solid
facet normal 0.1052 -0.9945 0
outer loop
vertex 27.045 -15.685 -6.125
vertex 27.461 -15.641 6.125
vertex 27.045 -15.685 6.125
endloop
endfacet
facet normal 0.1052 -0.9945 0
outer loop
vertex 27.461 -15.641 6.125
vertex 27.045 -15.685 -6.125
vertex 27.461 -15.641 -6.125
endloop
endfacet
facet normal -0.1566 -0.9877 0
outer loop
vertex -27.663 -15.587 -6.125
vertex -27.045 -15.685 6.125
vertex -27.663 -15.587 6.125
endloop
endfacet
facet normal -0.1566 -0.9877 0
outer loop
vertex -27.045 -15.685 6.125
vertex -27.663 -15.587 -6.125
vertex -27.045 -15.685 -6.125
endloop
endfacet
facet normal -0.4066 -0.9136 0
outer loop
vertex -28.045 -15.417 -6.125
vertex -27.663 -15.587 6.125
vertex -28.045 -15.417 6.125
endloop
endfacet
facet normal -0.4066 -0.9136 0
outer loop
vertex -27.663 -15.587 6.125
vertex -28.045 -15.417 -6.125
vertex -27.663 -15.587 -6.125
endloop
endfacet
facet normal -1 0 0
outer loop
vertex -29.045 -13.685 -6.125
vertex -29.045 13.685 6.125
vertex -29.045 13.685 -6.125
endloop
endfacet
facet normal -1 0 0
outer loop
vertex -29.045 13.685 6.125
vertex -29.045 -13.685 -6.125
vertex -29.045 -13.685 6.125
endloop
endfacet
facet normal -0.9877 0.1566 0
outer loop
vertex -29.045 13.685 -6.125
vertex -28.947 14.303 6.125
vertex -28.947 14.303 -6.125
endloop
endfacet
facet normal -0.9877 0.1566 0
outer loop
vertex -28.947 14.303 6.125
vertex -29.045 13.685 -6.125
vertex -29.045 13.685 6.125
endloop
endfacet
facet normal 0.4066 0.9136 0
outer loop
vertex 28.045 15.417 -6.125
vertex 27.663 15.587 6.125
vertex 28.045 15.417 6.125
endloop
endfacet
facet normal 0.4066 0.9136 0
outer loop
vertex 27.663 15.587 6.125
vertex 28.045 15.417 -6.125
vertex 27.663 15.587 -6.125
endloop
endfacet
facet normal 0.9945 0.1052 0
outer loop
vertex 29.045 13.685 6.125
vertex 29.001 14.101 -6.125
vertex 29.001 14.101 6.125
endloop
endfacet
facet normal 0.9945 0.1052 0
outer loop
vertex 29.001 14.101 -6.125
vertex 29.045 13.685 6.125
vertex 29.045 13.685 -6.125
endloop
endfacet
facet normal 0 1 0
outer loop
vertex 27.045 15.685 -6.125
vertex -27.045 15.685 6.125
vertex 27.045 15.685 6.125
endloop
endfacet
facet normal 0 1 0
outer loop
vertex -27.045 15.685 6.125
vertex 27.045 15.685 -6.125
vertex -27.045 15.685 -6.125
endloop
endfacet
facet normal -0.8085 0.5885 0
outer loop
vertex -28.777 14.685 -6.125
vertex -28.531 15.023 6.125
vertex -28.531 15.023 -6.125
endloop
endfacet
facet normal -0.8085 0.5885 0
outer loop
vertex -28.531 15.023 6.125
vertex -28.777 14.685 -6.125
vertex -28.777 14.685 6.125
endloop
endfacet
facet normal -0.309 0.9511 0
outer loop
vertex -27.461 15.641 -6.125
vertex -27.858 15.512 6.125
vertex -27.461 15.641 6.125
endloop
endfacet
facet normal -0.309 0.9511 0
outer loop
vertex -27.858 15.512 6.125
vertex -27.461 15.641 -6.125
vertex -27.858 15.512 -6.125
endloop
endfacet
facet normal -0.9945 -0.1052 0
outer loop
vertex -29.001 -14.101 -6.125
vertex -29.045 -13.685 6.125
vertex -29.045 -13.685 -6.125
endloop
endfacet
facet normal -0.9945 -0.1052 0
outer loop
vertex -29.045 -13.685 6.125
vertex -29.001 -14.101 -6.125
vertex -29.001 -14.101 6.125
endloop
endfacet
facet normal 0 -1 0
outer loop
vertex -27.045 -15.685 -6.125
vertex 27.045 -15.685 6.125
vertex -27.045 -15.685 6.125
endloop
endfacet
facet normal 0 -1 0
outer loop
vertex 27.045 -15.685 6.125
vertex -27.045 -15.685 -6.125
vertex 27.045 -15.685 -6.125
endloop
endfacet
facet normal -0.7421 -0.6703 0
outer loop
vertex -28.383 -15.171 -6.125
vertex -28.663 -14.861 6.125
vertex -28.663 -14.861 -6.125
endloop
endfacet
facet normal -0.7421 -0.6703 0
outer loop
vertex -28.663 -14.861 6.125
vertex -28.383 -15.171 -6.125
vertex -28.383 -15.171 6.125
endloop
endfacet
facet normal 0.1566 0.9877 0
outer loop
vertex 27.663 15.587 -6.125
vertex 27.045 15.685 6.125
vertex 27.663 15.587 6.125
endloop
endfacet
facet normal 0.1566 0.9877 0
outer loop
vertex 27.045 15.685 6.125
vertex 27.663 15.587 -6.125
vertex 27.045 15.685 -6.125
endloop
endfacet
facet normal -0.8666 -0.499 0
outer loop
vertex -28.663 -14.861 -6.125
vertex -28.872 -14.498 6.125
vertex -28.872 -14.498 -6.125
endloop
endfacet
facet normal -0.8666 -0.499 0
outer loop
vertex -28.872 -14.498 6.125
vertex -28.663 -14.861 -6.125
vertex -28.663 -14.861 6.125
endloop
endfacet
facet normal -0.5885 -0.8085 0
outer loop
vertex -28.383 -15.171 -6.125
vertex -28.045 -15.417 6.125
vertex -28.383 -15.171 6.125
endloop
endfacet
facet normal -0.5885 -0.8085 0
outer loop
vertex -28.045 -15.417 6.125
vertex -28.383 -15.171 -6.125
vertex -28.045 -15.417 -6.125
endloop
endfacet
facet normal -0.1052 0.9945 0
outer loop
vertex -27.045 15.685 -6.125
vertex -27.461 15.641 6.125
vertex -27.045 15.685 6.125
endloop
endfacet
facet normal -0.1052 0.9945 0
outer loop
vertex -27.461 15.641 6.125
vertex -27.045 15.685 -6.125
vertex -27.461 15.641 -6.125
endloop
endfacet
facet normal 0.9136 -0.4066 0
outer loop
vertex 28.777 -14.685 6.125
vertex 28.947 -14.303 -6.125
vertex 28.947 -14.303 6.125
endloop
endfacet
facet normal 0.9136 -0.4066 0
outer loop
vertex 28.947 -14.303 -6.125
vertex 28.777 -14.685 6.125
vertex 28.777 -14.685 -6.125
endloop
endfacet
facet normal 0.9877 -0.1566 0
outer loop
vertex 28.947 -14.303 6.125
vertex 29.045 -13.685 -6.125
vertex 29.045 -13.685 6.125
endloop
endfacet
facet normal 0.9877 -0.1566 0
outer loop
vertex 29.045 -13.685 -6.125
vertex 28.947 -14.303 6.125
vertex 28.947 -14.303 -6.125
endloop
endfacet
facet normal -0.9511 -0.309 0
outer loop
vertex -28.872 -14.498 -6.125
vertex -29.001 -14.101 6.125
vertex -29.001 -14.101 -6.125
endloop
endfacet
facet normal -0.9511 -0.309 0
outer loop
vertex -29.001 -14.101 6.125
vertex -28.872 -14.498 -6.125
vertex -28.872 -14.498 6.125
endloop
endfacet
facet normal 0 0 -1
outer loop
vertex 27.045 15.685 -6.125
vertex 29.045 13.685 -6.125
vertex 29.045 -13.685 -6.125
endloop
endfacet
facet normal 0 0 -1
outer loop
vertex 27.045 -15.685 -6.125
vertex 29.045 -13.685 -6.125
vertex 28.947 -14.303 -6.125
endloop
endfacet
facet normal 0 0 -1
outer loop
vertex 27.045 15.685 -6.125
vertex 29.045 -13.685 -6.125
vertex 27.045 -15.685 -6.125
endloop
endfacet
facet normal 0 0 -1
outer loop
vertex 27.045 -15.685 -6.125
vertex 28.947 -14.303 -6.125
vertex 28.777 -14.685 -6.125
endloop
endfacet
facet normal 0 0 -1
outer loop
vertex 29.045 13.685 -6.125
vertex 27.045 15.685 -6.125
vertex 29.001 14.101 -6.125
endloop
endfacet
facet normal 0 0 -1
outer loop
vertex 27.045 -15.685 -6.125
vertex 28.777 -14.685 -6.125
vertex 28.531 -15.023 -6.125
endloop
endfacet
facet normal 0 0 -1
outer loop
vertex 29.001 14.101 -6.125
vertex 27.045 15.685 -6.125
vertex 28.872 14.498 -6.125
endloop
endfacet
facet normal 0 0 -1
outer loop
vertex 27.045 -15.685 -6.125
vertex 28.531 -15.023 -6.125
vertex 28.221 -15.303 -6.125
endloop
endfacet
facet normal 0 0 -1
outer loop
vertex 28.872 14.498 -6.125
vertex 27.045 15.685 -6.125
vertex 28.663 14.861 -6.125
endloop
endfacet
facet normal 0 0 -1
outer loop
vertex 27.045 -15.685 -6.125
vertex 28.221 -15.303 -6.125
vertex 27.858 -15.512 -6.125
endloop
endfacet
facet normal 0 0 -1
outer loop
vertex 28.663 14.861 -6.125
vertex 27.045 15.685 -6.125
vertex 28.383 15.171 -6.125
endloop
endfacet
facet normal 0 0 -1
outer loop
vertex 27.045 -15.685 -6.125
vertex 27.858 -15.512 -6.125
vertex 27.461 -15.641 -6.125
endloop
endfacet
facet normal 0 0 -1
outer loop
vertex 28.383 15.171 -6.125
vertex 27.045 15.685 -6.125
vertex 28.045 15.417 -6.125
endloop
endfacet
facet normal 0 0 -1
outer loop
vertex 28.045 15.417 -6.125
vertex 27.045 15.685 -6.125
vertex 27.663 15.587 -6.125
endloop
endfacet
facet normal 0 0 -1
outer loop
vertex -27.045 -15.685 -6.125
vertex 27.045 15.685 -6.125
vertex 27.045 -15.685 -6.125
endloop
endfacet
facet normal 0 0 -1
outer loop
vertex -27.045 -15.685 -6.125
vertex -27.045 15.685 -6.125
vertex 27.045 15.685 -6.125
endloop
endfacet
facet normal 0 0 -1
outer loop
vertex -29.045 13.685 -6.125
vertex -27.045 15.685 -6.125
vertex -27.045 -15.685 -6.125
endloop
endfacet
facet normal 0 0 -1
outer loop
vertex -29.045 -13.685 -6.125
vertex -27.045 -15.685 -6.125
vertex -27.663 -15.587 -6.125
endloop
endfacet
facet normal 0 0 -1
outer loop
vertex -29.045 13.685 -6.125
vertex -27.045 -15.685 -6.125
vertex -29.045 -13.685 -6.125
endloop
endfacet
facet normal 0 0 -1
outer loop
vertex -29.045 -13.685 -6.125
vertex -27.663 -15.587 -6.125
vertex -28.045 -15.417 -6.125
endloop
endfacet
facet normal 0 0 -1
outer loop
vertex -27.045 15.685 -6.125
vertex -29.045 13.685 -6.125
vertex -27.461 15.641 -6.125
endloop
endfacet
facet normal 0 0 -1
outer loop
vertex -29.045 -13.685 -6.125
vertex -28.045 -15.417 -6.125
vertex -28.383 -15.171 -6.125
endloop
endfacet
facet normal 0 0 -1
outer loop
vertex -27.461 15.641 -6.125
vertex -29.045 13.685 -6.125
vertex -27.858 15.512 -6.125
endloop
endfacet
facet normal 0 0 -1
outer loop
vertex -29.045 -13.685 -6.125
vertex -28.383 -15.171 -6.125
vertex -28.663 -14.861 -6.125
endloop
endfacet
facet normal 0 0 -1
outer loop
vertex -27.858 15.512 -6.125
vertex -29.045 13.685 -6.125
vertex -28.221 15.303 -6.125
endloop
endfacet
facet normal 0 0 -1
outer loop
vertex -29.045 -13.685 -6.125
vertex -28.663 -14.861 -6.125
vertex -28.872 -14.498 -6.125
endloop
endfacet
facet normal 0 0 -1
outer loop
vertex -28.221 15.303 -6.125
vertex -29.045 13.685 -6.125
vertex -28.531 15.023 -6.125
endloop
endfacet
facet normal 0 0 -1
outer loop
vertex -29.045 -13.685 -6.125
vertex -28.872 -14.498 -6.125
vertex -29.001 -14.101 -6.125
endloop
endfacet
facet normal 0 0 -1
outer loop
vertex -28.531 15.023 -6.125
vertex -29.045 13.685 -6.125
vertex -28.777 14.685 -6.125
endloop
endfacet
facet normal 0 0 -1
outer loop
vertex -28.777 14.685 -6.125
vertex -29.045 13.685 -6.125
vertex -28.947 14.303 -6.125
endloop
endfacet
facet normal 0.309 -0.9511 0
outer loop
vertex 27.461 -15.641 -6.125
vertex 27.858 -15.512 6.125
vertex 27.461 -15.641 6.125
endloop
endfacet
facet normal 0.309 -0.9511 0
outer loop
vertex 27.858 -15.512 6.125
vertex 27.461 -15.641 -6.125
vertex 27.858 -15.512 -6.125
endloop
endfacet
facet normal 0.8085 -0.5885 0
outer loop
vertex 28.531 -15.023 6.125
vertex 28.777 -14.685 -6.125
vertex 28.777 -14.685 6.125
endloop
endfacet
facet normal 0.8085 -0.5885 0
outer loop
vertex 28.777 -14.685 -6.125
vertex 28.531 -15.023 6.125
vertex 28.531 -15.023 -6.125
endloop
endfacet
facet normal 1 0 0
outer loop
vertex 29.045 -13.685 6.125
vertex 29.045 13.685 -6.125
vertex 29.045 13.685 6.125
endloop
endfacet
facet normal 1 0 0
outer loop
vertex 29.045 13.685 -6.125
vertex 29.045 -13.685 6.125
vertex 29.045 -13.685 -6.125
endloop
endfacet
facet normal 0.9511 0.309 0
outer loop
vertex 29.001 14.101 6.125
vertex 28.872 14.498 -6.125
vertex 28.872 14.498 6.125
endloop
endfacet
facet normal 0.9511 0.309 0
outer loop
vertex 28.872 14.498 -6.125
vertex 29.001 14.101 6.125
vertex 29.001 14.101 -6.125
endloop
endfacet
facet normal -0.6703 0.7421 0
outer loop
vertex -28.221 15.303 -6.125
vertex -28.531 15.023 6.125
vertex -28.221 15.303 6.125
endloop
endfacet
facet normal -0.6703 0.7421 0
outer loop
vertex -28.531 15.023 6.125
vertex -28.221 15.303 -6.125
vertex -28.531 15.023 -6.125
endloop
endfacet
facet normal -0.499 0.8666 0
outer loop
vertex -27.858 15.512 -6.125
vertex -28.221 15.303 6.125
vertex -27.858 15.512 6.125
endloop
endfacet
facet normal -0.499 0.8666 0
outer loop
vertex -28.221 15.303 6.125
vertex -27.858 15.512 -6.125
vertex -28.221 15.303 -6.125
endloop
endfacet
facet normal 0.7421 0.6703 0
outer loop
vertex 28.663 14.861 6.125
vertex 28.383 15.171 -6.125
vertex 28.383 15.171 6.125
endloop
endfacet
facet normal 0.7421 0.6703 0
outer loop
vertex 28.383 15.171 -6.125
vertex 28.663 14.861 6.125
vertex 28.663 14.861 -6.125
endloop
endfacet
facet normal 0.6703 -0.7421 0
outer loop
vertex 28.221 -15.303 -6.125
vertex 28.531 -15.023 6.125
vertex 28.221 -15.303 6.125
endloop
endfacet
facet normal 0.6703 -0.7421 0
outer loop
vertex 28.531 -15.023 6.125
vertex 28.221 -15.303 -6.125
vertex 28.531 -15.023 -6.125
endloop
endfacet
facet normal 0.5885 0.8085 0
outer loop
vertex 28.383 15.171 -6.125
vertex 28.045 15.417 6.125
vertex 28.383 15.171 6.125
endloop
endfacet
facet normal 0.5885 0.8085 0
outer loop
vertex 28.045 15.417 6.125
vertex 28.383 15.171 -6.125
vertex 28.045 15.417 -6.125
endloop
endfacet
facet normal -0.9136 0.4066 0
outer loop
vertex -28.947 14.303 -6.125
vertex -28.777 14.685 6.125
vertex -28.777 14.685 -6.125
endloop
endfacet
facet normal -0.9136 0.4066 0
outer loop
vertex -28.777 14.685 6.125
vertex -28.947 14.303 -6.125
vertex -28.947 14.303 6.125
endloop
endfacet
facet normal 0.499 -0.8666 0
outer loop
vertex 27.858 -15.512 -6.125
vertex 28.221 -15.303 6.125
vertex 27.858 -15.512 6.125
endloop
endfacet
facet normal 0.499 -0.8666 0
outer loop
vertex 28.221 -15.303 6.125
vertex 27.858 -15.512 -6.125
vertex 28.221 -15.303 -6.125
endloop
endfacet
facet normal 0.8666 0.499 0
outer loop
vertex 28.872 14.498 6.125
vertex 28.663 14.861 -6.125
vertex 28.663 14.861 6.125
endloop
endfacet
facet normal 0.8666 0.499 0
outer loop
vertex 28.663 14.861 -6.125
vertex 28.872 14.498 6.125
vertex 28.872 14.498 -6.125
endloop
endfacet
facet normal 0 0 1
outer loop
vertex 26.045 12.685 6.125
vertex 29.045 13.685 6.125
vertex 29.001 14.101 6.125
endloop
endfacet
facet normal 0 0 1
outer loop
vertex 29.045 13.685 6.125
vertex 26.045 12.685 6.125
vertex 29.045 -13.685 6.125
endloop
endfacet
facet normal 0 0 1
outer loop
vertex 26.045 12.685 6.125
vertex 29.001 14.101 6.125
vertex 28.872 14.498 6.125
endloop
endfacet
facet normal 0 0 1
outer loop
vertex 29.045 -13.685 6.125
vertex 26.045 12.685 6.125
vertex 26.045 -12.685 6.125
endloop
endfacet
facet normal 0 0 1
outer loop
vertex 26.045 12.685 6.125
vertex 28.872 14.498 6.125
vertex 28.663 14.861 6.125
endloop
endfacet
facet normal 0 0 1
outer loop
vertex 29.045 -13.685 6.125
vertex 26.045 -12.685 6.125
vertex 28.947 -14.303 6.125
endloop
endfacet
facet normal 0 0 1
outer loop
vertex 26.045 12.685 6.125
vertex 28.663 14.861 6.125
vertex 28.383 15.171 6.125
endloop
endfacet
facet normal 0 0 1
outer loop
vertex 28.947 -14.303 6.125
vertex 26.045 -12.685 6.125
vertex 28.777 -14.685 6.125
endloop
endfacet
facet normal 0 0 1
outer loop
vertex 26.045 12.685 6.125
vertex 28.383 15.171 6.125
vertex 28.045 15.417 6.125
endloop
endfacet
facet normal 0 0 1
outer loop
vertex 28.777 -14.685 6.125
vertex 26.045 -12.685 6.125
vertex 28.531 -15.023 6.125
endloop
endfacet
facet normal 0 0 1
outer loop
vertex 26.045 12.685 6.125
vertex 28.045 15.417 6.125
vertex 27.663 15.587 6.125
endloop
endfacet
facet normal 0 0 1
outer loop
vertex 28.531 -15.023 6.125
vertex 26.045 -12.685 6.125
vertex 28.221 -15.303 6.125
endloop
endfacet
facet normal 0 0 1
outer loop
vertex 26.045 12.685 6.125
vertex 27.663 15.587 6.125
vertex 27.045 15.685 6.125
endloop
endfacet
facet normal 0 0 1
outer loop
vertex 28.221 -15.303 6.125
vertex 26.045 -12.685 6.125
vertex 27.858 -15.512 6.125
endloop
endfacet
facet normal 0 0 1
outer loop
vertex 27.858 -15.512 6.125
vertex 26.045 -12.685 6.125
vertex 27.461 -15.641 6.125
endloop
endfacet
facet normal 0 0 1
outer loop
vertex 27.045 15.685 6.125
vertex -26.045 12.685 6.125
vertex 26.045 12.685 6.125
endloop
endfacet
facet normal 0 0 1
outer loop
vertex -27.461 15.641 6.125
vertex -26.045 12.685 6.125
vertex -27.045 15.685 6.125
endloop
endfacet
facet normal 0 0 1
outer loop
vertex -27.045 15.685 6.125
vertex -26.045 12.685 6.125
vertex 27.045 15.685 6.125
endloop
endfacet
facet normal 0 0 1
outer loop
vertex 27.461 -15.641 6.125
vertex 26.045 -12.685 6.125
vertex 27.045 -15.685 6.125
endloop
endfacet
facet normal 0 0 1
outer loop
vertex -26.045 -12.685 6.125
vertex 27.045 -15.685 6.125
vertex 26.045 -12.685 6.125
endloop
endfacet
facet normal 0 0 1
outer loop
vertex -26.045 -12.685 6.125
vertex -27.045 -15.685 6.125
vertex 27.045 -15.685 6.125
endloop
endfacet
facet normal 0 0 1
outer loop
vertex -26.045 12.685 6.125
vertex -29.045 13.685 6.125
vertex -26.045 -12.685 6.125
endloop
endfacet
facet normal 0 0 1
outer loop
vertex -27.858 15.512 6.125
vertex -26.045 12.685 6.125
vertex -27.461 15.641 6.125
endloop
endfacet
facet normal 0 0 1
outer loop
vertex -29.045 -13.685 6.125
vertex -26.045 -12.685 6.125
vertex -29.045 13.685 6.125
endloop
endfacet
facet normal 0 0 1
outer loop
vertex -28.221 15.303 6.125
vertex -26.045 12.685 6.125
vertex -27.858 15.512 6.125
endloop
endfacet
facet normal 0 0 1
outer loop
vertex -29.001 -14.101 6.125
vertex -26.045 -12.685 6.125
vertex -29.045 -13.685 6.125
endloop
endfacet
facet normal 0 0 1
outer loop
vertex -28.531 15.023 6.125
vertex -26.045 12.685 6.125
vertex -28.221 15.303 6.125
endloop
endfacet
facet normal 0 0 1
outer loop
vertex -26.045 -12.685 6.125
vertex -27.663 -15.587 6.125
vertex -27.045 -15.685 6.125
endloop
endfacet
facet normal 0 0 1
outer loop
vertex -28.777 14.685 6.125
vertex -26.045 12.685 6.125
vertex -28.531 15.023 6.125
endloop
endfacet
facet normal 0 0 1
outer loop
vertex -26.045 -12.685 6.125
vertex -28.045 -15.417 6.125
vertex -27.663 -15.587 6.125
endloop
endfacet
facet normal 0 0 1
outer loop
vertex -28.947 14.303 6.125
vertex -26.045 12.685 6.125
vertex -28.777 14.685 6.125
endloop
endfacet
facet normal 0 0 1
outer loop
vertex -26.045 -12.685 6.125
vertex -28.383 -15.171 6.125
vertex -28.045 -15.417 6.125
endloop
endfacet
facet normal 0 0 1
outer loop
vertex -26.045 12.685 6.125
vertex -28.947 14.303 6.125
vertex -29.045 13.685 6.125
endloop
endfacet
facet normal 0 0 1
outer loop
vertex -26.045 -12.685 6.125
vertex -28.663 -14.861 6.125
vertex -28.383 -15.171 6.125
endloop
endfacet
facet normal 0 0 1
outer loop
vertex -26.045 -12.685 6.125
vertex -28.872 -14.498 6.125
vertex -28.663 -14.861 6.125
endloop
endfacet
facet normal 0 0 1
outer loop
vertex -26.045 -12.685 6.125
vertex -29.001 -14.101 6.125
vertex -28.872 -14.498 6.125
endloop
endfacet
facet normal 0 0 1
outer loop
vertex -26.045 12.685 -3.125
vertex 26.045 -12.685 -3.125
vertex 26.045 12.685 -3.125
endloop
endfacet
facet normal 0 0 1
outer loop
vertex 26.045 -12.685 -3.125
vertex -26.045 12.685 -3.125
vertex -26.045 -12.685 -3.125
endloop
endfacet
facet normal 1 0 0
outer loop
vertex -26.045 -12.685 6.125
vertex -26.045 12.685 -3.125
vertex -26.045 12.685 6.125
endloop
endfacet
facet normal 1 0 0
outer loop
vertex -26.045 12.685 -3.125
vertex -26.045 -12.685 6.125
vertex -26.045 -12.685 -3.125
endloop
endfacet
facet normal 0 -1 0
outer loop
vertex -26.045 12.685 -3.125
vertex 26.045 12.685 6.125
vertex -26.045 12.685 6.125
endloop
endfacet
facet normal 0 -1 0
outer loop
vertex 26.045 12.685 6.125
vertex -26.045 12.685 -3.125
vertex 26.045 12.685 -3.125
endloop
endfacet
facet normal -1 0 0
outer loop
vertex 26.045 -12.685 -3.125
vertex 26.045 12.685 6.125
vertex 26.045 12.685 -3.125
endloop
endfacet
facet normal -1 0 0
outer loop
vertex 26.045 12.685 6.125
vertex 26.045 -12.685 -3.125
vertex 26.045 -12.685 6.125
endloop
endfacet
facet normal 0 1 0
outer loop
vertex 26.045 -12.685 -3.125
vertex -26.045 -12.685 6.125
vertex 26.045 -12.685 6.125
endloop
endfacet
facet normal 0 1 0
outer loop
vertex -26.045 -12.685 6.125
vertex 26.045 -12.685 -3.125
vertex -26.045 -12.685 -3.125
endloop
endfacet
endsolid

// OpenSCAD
// file: myTools.scad
module tube (r = 0, d = 0, l = 0, 
            thick = 0, 
            bCentered = true, 
            taper_pct = 0, 
            circlip = false) // r=radius d=dia l=length 
{
    assert( r != 0 || d != 0, "specify one of radius or diameter");
    assert( l != 0 , "tube: need length 'l' to be non zero");
    assert( thick != 0, "wall thickness cannot be zero");

    punch = $preview ? .2 : 0; // stop funny view artifact

    dia = r ? r * 2 : d;

    od = ((thick > 0) ? dia + thick * 2 : dia);
    id = (thick > 0) ? dia             : dia  + thick *2; 

    
    
    if (thick > 0)
        echo ("tube\tMIN id = ", id, "od = ", od, "wall = ", thick, "center= ", bCentered);
    else
        echo ("tube\tMAX od = ", od, "id = ", id, "wall = ", thick, "center= ", bCentered);

    echo ("tube\tHeigth = ", l);
        
    if (taper_pct != 0)
    {
        echo ("tube\t*** OD expanded by ", taper_pct, "%, : bottom od = ", od * (1. +taper_pct/100), "top od = ", od);
    }
    
    assert(dia || dia < 0, "tube : missing r or d ");
    
    // if taper_pct specified, the base will always be closest to 0,0,0
    translate([ 0, 0, taper_pct == 0 ? 0: bCentered ? l/2:l  ])
    rotate([0, taper_pct == 0 ? 0 : 180, 0 ])

    difference()
    {
        // make a reese's cup
        {
            color("YELLOW", .3)
            linear_extrude(height= l, scale = 1 + taper_pct/100)
                difference()
                {
                    circle(d = od);
                    circle(d = .5);
                }
        }
    
     // hollow out reessed cup
     color("GREEN")
     translate([0, 0, -punch/2])
     linear_extrude(height= l+ punch*2, $fn=100)
     {
        circle(d = id);
        if (circlip) #square([1 + punch, od ]);
     }
    
    }
}
//==============================================================================
        
module abox (dims, 
            thick = 0, 
            bCentered = true, 
            round_out = 0, 
            round_in = 0, 
            bSolid = false,
            bHollow = false,
            elevator = 0)   // move bottom up by X
{
    punch = $preview ? .1 : 0; // stop funny view artifact
    
    assert(thick != 0, "Thick must be specified. +=outside dim, -= inside dims");
    assert(dims.z > thick, "wall thickness too large for depth of box");

    wall2 = abs(thick) * 2; // 2 walls in each direction
    wall = wall2 / 2;
    
    // box either grows inward (thick < 0) or outward (thick > 0)  from dims
    fat = dims + [ wall2, wall2, wall];
    thin = dims - [ wall2, wall2, wall];
    
    offset = (thick > 0 && bCentered == false) ? wall : 0;
    
    //echo ("abox : adjusting x,y,z by ", offset, " to move origin from  center to 0,0,0");
    translate( [ bCentered ? 0 : dims.x /2 + offset, bCentered ? 0 : dims.y /2 + offset, bCentered ? 0 : dims.z /2 + offset/2]) 
    {
        if (thick > 0)
        {   
            // wall grows outwards from users dim
            echo ("making a box, MAX INSIDE dim = ", dims, "a wall=", thick, "mm ... max outside = ", fat, " mm");
        }
        else
        {
            // wall grows inward from users dime
            echo ("making a box, MAX OUTSIDE dim = ", dims, "a wall=", thick, "mm ... min inside = ", thin, " mm");
        }
        
        // linear extrude alway works in the positive x/y plane an goes upward.
        // after calc, re-center about 0,0,0 where a bCentered cube would be
        
        translate([ 0, 0, thick > 0  ? -fat.z/2 : -dims.z/2 ])
        difference()
        {
            echo ("round_out = ", round_out);

            // MAKE SOLID BOX --------------------------------------
            router_outside = round_out ? round_out : 0;
            x = thick > 0  ? fat.x - router_outside : dims.x - router_outside;
            y = thick > 0  ? fat.y - router_outside : dims.y - router_outside;


            // MAKE PUCHNED INSIDE
            // using 'offset' it will add r on all dimensions, then round., 
            // so now you have fatter perimeter than you started with :(
            //  but at least the corners are round.
            
            // Compensate by shrinking dimension by r, 
            // and then by calling offset, offset will then add it back

            color("YELLOW", .2)

            linear_extrude(thick > 0  ? fat.z : dims.z)
            if (round_out)
            {
                offset( r= round_out, $fn=30)
                square( [x - router_outside, y - router_outside], true);
            }
            else square( [x - router_outside, y - router_outside], true);
           
            // time to punch out the inside if requested.
            if (bSolid == false)
            {
                hollow_offset = bHollow ? fat.z/2 + .2  : dims.z/2 +.2;
                // punching out inside. its either dims or thin.
                router_inside = round_in;
                echo ("round_in = ", router_inside);
                xi = thick > 0  ? dims.x  : thin.x;
                yi = thick > 0  ? dims.y : thin.y ;

                color("GREEN")

                // move 'punch' up if you need a bottom else zero (hollowed out)

                translate([ 0,0, bHollow ? -.1 : wall + elevator]) 
                linear_extrude(thick > 0  ? fat.z - wall  + hollow_offset : dims.z - wall + hollow_offset)
                //#linear_extrude(fat.z - wall  + hollow_offset)
                
                if (round_in) 
                {
                    offset( r= round_in, $fn=30)
                    square( [ xi - router_inside, yi - router_inside], true);
                }
                else
                    square( [ xi, yi], true);
            }
        }
    }
 }


// 50x25x10 box walls grow inward (-2). on center origin midpoint
// rounded outside (default), sharp corner inside(default), bCentered about 0,0,0
//color("GREEN", .9)
//abox([50,25, 10], -2, true); 


// 50x25x10 box walls grow inward (-2). on center origin midpoint
// sharp outside corners, rounded inside corners. Sit on x,y plane
color("BLUE", .9)
abox([50,20, 10], +2, round_in=2, bCentered = false);  // 50x25x10 box inside dim origin has 0,0


// 50x25x10 box walls grow inward (-2). on center origin midpoint
// sharp corners inside and out. sits on x,y plane
color("GREY", .9)//
translate([ 55, 0, 0])      
abox([50,20, 10], +2, round_out=3, false);

color("PINK", .9)//
translate([ 115, 10, 10])      
abox([86.66, 56.865, 5], -5, bHollow = true, bCentered = false); 

color("GREEN", .9)//
translate([ 140, 10, -10])      
abox([86.66, 56.865, 5], 3, bHollow = true, bCentered = false); 

/*
// 50x25x10 box walls grow inward (-2). on center origin midpoint
// round corners outside and SOLID
color("BLUE", .9)//
translate([ 55, 0, 0])      
abox([50,25, 10], +2, round_out=2, round_in=0, false, bSolid = true); // 50x25x10 box outside dim origin is 0,0
*/

//translate ([-30,-30, 0])
{
/*
    // tube outer dia  20, inner dia = (20 - 8)
    color("PINK")
    tube (d = 20, l = 20, thick = -8, bCentered = false);

    // tube, inner dia = (2* 10), outer dia = ((2*10) + 2) 
    color("PURPLE", .3)
    tube (r = 10, l = 20, thick = +2, bCentered= true);
*/
/*
    tube (d = 60, l = 20, thick = -6, bCentered = false);

    translate([0, 0, 50])
    tube (d = 60, l = 20, thick = -6, bCentered = false, taper_pct = 20, circlip = true);
    //color("GREEN")
    //tube (d = 20, l = 20, thick = -2, bCentered = false, taper = 10, circlip = true);
*/

}
// main file
//use <otherPeoplesWork/threads-scad/threads.scad>
use <myTools.scad>

/* [Hidden] */
TWEAK=.25;

x = 48.09 + 4;  // so we can pop it out if we have to.
y = 25.37;  // tight
z = 9 + TWEAK ;  // it will sit on its pins.   

$fn=60;   //circle quantize 360/10=36 degrees per side

// container for the AQ
Wave_insideDIM = [ x, y, z ];


DIA = 4;
BN_DIA = 2;
DIST = DIA + BN_DIA;
LENGTH= x * 1.2;
WALL = 3;

across =5;  // must be odd
down = 11;     // must be odd

abox( Wave_insideDIM, thick = +WALL, round_out =2, bCentered = true);

/*
module oneRowX(ACROSS, DOWN)
{
    centerDot_x = (ACROSS -1) /2;
    //echo("centerDot_x is ", centerDot_x + 1);
    translate([ -(centerDot_x) * DIST, 0, 0 ])
    for ( ac = [ 0: 1: ACROSS -1 ])
        //echo ("ac = ", ac)
        translate([ ac * (DIST), 0, -LENGTH/2 ])
            cylinder( d= DIA, h= LENGTH, center= false);
}


module makeArray(ACROSS, DOWN, ROTATE)
for (dn = [ 0: 1: (DOWN -1)/2])
{
    rotate(ROTATE)
    translate ([0, dn * (DIST), 0]) // make postive row
        oneRowX(ACROSS);

    rotate(ROTATE)
    translate ([0, -dn * DIST, 0])  // mirror negative row
        oneRowX(ACROSS);
}

difference()
{
    abox( Wave_insideDIM, thick = +4, round_out =2, bCentered = true);
 
//    makeArray(across, down, [0, 90, 0]);
//    makeArray(13 , 5, [90, 0, 0]);
}
*/
